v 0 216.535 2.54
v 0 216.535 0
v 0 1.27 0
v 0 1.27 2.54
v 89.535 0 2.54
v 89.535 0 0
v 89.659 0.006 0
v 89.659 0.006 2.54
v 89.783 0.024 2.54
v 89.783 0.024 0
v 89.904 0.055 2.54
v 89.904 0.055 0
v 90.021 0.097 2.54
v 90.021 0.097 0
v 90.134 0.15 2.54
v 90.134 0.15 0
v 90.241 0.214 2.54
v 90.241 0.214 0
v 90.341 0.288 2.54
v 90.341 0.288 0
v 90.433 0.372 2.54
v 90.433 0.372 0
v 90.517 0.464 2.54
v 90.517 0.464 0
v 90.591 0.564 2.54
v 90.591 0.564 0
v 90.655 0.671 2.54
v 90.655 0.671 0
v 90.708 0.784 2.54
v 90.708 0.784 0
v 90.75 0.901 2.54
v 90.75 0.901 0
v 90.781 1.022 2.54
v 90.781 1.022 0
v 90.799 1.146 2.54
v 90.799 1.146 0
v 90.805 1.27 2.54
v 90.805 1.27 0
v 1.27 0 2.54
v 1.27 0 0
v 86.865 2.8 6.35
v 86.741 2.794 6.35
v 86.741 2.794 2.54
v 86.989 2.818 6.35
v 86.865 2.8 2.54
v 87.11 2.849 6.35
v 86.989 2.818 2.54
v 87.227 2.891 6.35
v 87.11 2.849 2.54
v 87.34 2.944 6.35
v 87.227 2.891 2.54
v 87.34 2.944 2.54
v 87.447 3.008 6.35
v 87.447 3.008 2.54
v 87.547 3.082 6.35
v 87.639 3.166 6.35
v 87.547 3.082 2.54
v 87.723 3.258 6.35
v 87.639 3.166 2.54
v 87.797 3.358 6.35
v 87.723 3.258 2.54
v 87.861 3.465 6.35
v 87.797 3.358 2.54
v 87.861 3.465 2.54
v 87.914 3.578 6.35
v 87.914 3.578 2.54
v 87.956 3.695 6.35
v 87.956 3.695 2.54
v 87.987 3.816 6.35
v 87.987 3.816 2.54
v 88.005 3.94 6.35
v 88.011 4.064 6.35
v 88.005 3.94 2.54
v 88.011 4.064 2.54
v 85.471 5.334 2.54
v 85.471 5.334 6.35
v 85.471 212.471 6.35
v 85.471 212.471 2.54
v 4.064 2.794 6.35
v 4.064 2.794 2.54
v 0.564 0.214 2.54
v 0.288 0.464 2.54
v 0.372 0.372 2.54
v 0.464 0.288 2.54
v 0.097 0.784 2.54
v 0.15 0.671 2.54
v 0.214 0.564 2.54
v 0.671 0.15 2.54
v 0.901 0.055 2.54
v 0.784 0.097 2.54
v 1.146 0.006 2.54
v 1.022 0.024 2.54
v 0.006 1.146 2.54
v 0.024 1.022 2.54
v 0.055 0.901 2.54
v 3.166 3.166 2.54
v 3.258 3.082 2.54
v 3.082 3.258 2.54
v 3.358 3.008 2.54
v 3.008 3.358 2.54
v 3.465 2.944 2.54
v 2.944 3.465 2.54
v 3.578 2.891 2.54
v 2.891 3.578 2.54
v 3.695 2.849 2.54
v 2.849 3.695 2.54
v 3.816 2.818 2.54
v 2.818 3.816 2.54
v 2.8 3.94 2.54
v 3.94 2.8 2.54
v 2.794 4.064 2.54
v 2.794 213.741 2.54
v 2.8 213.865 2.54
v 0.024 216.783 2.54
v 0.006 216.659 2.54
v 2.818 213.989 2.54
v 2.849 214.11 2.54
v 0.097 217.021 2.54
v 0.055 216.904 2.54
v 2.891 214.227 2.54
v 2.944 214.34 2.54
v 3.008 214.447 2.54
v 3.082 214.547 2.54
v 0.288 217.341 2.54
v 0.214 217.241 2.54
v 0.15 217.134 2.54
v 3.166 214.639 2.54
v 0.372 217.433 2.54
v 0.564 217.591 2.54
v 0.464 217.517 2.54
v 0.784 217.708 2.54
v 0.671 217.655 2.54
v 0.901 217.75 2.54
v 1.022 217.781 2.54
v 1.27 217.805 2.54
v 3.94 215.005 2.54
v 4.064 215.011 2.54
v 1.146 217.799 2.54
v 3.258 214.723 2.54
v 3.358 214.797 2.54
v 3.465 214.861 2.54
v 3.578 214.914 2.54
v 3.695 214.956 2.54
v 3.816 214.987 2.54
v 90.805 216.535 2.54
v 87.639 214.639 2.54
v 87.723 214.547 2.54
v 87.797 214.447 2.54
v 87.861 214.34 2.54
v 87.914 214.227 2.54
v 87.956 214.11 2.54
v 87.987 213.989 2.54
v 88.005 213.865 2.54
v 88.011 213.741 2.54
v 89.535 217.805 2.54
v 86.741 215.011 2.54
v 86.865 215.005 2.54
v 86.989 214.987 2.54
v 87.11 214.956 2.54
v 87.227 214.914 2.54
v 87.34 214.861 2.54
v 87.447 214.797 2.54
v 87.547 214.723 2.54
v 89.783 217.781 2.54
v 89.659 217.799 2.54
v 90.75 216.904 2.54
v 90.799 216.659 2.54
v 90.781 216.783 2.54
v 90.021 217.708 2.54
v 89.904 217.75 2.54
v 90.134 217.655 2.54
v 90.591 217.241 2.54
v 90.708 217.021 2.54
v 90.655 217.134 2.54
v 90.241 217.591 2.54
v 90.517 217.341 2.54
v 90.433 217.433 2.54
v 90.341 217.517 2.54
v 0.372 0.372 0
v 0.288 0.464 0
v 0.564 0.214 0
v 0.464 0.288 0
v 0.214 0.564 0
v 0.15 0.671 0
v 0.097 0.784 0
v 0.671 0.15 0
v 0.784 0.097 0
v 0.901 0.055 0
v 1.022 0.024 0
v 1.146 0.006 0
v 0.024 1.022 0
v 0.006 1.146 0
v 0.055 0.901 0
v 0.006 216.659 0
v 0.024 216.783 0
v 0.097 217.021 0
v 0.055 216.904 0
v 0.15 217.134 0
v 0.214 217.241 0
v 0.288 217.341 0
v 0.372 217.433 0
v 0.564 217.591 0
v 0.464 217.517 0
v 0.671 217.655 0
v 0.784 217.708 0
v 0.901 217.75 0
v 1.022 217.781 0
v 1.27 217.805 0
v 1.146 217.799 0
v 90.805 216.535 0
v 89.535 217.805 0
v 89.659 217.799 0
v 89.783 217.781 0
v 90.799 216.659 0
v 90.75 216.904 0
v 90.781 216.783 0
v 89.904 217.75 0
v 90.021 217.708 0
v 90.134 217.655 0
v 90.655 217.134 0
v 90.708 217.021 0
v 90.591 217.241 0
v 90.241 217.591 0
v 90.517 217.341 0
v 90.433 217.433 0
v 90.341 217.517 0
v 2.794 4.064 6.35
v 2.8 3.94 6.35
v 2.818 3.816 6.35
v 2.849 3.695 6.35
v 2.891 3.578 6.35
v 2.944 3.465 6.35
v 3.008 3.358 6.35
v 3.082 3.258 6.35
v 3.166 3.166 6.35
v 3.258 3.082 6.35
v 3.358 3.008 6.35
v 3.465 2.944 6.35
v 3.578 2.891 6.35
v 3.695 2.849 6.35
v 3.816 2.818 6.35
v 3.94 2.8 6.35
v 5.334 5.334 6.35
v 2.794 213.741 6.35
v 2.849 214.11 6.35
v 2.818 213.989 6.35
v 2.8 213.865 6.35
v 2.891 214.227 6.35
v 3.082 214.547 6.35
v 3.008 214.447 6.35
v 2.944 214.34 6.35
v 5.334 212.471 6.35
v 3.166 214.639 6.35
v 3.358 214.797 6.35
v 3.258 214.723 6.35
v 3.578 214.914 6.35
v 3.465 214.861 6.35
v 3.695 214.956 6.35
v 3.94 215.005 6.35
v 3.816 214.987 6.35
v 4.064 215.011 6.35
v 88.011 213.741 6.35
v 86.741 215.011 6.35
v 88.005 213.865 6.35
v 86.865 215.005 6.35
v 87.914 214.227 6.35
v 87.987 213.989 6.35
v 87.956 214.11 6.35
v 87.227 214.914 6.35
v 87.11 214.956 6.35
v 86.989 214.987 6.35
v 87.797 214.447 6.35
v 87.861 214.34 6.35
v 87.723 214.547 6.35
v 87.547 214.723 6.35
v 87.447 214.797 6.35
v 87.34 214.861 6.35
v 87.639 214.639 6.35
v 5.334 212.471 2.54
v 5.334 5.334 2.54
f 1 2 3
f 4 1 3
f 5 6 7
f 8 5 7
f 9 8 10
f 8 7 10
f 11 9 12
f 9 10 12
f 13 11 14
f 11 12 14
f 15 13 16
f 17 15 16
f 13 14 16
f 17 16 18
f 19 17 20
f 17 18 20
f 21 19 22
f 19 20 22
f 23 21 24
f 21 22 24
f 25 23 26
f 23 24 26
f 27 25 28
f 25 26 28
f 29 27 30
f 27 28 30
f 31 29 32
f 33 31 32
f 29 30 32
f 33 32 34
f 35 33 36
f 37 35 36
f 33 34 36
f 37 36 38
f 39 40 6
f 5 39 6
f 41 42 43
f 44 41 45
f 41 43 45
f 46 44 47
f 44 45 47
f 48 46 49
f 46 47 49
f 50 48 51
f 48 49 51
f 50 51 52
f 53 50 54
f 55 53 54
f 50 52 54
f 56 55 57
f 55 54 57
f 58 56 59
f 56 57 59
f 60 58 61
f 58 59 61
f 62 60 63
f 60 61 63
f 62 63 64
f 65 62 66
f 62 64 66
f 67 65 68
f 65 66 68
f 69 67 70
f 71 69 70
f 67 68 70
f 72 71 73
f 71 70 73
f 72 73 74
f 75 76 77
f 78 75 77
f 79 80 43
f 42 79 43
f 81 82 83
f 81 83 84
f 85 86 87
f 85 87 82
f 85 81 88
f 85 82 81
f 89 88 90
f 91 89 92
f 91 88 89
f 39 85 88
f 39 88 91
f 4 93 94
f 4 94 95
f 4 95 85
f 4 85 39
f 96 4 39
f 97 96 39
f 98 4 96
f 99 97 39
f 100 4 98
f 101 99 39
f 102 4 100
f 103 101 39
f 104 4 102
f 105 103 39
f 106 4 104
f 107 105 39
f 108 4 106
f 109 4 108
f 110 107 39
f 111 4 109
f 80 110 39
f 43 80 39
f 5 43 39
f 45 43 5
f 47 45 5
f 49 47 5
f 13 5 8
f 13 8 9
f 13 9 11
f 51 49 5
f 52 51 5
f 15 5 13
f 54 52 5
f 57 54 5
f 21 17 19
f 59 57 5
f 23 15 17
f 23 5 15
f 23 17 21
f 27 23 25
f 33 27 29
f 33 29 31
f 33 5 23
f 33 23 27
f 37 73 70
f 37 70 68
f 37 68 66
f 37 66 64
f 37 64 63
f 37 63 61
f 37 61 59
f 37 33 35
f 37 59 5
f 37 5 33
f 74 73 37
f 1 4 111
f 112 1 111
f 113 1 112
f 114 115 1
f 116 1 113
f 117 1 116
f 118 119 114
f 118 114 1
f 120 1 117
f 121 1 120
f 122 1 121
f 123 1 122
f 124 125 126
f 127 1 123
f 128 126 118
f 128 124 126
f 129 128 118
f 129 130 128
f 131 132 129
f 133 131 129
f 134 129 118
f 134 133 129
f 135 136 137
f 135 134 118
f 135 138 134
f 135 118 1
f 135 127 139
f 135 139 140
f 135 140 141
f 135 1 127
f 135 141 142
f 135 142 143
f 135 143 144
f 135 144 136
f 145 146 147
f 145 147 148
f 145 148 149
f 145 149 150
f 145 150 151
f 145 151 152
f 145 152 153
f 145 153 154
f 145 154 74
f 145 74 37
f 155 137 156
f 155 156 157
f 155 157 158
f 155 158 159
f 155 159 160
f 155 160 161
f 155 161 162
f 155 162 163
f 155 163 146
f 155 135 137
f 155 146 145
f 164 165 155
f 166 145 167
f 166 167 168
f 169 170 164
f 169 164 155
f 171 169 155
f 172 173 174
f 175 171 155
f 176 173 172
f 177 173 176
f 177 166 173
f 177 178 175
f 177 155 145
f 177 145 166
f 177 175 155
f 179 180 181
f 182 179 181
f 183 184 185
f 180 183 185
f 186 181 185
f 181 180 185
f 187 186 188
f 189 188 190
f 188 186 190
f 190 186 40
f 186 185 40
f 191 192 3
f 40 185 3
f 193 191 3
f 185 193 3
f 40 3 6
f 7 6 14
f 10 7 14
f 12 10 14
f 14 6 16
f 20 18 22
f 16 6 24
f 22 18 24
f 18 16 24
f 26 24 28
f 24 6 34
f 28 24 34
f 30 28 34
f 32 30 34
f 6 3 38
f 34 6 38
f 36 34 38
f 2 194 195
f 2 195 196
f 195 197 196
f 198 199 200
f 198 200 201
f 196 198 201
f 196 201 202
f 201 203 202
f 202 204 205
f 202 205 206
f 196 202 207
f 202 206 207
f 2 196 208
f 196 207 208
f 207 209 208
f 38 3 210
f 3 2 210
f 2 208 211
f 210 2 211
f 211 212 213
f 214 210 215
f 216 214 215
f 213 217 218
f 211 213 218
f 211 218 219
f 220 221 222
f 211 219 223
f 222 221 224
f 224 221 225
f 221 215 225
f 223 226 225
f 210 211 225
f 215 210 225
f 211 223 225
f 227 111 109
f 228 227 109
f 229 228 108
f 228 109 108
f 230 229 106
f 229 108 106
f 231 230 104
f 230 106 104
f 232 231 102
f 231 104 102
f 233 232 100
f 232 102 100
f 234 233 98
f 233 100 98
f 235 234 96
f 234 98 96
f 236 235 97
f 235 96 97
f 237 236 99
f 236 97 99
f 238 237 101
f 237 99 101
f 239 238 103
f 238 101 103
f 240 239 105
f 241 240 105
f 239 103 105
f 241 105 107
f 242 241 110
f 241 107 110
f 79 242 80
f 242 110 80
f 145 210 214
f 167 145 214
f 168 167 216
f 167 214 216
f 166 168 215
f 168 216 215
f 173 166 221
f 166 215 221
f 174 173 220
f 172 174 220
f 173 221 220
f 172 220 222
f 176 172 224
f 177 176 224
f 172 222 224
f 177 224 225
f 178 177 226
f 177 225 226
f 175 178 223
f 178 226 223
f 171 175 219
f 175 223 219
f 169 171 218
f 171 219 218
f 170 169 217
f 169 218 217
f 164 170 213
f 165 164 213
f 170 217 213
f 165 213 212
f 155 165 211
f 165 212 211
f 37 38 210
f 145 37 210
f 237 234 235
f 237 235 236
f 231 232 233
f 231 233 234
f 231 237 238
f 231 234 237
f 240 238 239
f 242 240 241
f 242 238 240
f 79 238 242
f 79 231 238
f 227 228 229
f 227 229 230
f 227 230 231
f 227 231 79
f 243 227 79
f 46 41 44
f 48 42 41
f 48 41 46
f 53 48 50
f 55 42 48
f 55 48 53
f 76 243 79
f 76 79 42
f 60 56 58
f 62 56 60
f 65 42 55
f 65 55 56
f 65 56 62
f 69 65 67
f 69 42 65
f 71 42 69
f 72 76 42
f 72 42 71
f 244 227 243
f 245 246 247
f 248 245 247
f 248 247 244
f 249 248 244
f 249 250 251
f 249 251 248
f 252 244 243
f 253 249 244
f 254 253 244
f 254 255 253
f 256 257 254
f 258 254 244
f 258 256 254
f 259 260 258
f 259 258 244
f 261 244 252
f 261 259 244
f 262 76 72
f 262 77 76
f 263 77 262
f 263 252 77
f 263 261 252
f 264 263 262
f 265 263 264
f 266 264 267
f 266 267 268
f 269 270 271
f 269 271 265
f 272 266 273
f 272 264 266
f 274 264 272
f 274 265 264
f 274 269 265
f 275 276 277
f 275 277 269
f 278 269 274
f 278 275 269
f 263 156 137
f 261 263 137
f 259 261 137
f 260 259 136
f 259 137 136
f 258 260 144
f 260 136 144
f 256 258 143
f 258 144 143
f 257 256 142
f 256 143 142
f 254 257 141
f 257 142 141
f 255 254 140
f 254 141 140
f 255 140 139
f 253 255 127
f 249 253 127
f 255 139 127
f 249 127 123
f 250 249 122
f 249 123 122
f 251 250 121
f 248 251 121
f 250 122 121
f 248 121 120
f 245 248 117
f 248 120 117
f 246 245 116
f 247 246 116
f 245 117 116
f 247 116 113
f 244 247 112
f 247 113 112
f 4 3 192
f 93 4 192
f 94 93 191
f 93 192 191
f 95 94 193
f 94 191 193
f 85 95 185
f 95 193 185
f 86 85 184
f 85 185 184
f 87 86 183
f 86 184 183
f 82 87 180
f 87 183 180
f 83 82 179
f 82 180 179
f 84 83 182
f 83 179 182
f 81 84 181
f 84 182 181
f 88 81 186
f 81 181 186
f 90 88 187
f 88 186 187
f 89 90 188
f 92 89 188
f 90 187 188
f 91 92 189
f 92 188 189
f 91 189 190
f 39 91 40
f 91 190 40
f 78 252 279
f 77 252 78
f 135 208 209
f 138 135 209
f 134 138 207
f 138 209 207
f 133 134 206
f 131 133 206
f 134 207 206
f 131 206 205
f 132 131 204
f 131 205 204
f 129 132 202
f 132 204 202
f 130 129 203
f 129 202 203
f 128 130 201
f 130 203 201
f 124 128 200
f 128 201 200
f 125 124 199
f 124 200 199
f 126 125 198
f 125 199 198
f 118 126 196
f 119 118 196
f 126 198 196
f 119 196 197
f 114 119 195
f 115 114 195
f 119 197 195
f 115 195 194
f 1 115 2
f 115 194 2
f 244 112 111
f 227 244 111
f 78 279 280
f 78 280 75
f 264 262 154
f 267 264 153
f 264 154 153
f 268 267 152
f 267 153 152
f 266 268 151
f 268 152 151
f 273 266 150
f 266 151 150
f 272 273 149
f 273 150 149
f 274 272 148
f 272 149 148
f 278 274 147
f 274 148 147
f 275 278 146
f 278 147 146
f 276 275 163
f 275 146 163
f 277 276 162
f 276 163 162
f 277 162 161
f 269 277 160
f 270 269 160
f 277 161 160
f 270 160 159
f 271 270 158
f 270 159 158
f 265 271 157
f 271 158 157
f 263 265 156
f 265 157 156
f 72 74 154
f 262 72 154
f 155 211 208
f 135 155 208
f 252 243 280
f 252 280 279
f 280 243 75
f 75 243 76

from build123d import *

# Parameters (mm, degrees)
F1_DEPTH = 2.54
F3_DEPTH = 6.35
F4_W     = 80.137
F4_H     = 207.137
F5_DEPTH = 3.81


with BuildPart() as f1:
    # F0 (on Top) → F1 (new body)
    with BuildSketch(Plane.XY):
        with BuildLine():
            ThreePointArc((0, 1.27), (0.371974, 0.371974), (1.27, 0))
            Line((1.27, 0), (89.535, 0))
            ThreePointArc((89.535, 0), (90.433026, 0.371974), (90.805, 1.27))
            Line((90.805, 1.27), (90.805, 216.535))
            ThreePointArc((90.805, 216.535), (90.433026, 217.433026), (89.535, 217.805))
            Line((89.535, 217.805), (1.27, 217.805))
            ThreePointArc((1.27, 217.805), (0.371974, 217.433026), (0, 216.535))
            Line((0, 216.535), (0, 1.27))
        make_face()
    extrude(amount=F1_DEPTH)

    # F2 (on Top) → F3 (join)
    with BuildSketch(Plane.XY):
        with BuildLine():
            Line((2.794, 213.741), (2.794, 4.064))
            ThreePointArc((2.794, 4.064), (3.165974, 3.165974), (4.064, 2.794))
            Line((4.064, 2.794), (86.741, 2.794))
            ThreePointArc((86.741, 2.794), (87.639026, 3.165974), (88.011, 4.064))
            Line((88.011, 4.064), (88.011, 213.741))
            ThreePointArc((88.011, 213.741), (87.639026, 214.639026), (86.741, 215.011))
            Line((86.741, 215.011), (4.064, 215.011))
            ThreePointArc((4.064, 215.011), (3.165974, 214.639026), (2.794, 213.741))
        make_face()
    extrude(amount=F3_DEPTH)

    # F4 (on face) → F5 (cut)
    with BuildSketch(Plane.XY.offset(6.35)):
        with Locations((45.4025, 108.9025)):
            Rectangle(F4_W, F4_H)
    extrude(amount=-F5_DEPTH, mode=Mode.SUBTRACT)


solid = f1.part
